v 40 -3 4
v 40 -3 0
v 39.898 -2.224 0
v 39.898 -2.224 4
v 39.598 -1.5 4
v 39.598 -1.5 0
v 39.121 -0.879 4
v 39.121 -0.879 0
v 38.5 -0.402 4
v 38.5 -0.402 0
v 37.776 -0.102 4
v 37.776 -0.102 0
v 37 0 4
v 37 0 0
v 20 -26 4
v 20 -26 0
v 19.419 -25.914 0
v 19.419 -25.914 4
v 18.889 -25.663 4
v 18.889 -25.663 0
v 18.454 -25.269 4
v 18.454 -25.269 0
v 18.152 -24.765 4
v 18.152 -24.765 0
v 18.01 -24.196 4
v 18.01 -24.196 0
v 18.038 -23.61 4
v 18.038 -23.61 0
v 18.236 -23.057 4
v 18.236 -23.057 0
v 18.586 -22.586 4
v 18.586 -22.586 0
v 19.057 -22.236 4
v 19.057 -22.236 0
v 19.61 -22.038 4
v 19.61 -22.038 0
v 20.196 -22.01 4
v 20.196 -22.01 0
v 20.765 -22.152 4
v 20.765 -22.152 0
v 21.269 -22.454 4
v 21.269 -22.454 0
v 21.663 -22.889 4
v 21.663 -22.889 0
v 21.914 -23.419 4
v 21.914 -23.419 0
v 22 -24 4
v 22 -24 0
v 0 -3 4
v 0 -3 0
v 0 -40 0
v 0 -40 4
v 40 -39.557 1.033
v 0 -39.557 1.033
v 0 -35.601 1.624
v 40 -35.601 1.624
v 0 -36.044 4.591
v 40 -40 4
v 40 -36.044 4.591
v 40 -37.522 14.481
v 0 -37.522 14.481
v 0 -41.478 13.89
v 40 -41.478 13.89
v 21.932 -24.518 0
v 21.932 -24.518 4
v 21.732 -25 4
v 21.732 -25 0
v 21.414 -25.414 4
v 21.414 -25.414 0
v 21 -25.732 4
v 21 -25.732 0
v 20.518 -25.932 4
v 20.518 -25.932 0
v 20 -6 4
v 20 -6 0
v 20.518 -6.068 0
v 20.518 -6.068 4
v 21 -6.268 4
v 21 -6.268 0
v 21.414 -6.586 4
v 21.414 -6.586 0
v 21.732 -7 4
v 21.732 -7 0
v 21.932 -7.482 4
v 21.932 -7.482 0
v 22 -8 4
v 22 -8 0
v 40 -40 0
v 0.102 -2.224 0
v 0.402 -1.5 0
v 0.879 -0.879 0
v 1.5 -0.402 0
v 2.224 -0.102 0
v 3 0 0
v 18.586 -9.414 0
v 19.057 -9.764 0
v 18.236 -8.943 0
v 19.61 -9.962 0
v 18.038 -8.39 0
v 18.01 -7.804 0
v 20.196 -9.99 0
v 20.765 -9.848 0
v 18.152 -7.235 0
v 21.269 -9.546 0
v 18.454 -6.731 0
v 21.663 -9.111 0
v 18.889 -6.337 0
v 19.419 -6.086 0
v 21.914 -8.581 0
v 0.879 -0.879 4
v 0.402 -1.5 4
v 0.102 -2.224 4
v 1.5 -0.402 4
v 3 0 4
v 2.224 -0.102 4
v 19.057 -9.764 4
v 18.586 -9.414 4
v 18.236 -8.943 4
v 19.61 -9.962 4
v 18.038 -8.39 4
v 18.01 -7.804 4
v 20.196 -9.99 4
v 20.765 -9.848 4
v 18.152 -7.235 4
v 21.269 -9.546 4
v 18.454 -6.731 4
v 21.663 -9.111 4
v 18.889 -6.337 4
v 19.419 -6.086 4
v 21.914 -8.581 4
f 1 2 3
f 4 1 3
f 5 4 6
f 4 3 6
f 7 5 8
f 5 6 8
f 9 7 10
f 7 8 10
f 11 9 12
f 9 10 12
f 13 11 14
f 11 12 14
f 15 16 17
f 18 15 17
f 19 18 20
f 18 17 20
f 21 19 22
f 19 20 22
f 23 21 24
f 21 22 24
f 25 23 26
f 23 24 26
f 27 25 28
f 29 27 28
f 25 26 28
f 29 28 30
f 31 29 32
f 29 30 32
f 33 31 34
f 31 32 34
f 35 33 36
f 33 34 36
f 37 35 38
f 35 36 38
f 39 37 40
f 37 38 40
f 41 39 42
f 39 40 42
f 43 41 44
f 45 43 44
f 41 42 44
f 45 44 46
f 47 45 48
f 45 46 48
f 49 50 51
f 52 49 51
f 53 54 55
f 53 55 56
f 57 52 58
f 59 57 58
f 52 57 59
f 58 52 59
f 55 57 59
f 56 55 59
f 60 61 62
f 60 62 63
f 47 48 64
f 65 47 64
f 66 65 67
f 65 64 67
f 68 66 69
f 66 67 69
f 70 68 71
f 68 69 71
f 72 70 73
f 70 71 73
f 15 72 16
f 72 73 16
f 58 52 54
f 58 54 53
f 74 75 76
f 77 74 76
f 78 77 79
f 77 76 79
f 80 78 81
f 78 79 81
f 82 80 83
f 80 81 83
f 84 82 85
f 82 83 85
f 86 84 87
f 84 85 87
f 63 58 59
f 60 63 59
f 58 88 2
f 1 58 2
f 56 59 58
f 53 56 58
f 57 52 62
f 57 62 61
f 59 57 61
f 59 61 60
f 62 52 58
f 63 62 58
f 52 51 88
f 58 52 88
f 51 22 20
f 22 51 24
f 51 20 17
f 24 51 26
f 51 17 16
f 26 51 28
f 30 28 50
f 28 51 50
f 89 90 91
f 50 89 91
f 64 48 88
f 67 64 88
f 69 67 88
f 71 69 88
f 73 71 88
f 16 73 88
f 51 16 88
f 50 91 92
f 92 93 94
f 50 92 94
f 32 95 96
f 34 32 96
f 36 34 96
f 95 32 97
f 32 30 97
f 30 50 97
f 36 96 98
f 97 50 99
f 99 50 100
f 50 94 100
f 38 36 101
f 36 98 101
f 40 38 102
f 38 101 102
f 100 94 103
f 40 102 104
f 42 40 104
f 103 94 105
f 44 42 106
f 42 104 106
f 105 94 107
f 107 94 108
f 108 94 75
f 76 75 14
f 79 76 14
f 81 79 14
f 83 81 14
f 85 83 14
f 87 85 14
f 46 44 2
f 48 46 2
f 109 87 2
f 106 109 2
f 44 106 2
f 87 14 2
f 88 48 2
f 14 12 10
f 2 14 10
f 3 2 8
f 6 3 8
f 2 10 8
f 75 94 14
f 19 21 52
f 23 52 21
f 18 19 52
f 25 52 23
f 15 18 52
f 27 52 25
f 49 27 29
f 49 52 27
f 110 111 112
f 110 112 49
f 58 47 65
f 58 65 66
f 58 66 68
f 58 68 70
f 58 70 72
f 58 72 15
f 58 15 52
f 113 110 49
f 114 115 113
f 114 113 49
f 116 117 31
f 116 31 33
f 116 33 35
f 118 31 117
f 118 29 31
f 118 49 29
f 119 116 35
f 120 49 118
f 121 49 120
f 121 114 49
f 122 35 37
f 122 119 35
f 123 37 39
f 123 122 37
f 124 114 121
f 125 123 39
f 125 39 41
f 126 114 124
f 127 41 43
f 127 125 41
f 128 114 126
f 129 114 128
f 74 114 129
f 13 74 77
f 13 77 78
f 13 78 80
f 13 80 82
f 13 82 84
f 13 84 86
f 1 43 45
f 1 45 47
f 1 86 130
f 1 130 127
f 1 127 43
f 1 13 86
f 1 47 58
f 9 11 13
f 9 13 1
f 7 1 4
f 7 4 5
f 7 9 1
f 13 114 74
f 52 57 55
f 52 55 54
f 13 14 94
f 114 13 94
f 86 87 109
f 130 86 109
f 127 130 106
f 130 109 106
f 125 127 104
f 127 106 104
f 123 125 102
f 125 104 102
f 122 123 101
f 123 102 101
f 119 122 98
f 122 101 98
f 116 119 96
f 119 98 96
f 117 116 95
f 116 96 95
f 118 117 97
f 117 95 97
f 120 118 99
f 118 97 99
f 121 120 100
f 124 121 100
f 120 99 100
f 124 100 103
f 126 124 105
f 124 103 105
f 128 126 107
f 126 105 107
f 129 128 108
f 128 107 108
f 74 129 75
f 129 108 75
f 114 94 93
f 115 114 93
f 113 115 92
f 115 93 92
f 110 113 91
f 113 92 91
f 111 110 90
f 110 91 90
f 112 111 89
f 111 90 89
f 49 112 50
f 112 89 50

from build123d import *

# Parameters (mm, degrees)
F1_DEPTH  = 4
F3_W      = 40
F3_H      = 4
F4_DEPTH  = 10
F4_FACE_W = 40
F4_FACE_H = 4
F5_DEPTH  = 3


with BuildPart() as f1:
    # F0 (on Top) → F1 (new body)
    with BuildSketch(Plane.XY):
        with BuildLine():
            Line((20, 0), (3, 0))
            ThreePointArc((3, 0), (0.87868, -0.87868), (0, -3))
            Line((0, -3), (0, -40))
            Line((0, -40), (20, -40))
            Line((20, -40), (40, -40))
            Line((40, -40), (40, -3))
            ThreePointArc((40, -3), (39.12132, -0.87868), (37, 0))
            Line((37, 0), (20, 0))
        make_face()
        with BuildLine():
            ThreePointArc((22, -24), (21.414214, -25.414214), (20, -26))
            ThreePointArc((20, -26), (18.585786, -22.585786), (22, -24))
        make_face(mode=Mode.SUBTRACT)
        with BuildLine():
            ThreePointArc((22, -8), (18.585786, -9.414214), (20, -6))
            ThreePointArc((20, -6), (21.414214, -6.585786), (22, -8))
        make_face(mode=Mode.SUBTRACT)
    extrude(amount=F1_DEPTH)


with BuildPart() as f4:
    # F3 (on face) → F4 (new body)
    with BuildSketch(Plane(origin=(0, -1.458648, 9.760044), x_dir=(1, 0, 0), z_dir=(0, -0.147809, 0.989016))):
        with Locations((20, -36.969397)):
            Rectangle(F3_W, F3_H)
    extrude(amount=F4_DEPTH)


with BuildPart() as f5:
    # F4_face (on face) → F5 (new body)
    with BuildSketch(Plane(origin=(20, -38.021968, 4.295619), x_dir=(1, 0, 0), z_dir=(0, 0.147809, -0.989016))):
        Rectangle(F4_FACE_W, F4_FACE_H)
    extrude(amount=F5_DEPTH)


solid = Compound([f1.part, f4.part, f5.part])
